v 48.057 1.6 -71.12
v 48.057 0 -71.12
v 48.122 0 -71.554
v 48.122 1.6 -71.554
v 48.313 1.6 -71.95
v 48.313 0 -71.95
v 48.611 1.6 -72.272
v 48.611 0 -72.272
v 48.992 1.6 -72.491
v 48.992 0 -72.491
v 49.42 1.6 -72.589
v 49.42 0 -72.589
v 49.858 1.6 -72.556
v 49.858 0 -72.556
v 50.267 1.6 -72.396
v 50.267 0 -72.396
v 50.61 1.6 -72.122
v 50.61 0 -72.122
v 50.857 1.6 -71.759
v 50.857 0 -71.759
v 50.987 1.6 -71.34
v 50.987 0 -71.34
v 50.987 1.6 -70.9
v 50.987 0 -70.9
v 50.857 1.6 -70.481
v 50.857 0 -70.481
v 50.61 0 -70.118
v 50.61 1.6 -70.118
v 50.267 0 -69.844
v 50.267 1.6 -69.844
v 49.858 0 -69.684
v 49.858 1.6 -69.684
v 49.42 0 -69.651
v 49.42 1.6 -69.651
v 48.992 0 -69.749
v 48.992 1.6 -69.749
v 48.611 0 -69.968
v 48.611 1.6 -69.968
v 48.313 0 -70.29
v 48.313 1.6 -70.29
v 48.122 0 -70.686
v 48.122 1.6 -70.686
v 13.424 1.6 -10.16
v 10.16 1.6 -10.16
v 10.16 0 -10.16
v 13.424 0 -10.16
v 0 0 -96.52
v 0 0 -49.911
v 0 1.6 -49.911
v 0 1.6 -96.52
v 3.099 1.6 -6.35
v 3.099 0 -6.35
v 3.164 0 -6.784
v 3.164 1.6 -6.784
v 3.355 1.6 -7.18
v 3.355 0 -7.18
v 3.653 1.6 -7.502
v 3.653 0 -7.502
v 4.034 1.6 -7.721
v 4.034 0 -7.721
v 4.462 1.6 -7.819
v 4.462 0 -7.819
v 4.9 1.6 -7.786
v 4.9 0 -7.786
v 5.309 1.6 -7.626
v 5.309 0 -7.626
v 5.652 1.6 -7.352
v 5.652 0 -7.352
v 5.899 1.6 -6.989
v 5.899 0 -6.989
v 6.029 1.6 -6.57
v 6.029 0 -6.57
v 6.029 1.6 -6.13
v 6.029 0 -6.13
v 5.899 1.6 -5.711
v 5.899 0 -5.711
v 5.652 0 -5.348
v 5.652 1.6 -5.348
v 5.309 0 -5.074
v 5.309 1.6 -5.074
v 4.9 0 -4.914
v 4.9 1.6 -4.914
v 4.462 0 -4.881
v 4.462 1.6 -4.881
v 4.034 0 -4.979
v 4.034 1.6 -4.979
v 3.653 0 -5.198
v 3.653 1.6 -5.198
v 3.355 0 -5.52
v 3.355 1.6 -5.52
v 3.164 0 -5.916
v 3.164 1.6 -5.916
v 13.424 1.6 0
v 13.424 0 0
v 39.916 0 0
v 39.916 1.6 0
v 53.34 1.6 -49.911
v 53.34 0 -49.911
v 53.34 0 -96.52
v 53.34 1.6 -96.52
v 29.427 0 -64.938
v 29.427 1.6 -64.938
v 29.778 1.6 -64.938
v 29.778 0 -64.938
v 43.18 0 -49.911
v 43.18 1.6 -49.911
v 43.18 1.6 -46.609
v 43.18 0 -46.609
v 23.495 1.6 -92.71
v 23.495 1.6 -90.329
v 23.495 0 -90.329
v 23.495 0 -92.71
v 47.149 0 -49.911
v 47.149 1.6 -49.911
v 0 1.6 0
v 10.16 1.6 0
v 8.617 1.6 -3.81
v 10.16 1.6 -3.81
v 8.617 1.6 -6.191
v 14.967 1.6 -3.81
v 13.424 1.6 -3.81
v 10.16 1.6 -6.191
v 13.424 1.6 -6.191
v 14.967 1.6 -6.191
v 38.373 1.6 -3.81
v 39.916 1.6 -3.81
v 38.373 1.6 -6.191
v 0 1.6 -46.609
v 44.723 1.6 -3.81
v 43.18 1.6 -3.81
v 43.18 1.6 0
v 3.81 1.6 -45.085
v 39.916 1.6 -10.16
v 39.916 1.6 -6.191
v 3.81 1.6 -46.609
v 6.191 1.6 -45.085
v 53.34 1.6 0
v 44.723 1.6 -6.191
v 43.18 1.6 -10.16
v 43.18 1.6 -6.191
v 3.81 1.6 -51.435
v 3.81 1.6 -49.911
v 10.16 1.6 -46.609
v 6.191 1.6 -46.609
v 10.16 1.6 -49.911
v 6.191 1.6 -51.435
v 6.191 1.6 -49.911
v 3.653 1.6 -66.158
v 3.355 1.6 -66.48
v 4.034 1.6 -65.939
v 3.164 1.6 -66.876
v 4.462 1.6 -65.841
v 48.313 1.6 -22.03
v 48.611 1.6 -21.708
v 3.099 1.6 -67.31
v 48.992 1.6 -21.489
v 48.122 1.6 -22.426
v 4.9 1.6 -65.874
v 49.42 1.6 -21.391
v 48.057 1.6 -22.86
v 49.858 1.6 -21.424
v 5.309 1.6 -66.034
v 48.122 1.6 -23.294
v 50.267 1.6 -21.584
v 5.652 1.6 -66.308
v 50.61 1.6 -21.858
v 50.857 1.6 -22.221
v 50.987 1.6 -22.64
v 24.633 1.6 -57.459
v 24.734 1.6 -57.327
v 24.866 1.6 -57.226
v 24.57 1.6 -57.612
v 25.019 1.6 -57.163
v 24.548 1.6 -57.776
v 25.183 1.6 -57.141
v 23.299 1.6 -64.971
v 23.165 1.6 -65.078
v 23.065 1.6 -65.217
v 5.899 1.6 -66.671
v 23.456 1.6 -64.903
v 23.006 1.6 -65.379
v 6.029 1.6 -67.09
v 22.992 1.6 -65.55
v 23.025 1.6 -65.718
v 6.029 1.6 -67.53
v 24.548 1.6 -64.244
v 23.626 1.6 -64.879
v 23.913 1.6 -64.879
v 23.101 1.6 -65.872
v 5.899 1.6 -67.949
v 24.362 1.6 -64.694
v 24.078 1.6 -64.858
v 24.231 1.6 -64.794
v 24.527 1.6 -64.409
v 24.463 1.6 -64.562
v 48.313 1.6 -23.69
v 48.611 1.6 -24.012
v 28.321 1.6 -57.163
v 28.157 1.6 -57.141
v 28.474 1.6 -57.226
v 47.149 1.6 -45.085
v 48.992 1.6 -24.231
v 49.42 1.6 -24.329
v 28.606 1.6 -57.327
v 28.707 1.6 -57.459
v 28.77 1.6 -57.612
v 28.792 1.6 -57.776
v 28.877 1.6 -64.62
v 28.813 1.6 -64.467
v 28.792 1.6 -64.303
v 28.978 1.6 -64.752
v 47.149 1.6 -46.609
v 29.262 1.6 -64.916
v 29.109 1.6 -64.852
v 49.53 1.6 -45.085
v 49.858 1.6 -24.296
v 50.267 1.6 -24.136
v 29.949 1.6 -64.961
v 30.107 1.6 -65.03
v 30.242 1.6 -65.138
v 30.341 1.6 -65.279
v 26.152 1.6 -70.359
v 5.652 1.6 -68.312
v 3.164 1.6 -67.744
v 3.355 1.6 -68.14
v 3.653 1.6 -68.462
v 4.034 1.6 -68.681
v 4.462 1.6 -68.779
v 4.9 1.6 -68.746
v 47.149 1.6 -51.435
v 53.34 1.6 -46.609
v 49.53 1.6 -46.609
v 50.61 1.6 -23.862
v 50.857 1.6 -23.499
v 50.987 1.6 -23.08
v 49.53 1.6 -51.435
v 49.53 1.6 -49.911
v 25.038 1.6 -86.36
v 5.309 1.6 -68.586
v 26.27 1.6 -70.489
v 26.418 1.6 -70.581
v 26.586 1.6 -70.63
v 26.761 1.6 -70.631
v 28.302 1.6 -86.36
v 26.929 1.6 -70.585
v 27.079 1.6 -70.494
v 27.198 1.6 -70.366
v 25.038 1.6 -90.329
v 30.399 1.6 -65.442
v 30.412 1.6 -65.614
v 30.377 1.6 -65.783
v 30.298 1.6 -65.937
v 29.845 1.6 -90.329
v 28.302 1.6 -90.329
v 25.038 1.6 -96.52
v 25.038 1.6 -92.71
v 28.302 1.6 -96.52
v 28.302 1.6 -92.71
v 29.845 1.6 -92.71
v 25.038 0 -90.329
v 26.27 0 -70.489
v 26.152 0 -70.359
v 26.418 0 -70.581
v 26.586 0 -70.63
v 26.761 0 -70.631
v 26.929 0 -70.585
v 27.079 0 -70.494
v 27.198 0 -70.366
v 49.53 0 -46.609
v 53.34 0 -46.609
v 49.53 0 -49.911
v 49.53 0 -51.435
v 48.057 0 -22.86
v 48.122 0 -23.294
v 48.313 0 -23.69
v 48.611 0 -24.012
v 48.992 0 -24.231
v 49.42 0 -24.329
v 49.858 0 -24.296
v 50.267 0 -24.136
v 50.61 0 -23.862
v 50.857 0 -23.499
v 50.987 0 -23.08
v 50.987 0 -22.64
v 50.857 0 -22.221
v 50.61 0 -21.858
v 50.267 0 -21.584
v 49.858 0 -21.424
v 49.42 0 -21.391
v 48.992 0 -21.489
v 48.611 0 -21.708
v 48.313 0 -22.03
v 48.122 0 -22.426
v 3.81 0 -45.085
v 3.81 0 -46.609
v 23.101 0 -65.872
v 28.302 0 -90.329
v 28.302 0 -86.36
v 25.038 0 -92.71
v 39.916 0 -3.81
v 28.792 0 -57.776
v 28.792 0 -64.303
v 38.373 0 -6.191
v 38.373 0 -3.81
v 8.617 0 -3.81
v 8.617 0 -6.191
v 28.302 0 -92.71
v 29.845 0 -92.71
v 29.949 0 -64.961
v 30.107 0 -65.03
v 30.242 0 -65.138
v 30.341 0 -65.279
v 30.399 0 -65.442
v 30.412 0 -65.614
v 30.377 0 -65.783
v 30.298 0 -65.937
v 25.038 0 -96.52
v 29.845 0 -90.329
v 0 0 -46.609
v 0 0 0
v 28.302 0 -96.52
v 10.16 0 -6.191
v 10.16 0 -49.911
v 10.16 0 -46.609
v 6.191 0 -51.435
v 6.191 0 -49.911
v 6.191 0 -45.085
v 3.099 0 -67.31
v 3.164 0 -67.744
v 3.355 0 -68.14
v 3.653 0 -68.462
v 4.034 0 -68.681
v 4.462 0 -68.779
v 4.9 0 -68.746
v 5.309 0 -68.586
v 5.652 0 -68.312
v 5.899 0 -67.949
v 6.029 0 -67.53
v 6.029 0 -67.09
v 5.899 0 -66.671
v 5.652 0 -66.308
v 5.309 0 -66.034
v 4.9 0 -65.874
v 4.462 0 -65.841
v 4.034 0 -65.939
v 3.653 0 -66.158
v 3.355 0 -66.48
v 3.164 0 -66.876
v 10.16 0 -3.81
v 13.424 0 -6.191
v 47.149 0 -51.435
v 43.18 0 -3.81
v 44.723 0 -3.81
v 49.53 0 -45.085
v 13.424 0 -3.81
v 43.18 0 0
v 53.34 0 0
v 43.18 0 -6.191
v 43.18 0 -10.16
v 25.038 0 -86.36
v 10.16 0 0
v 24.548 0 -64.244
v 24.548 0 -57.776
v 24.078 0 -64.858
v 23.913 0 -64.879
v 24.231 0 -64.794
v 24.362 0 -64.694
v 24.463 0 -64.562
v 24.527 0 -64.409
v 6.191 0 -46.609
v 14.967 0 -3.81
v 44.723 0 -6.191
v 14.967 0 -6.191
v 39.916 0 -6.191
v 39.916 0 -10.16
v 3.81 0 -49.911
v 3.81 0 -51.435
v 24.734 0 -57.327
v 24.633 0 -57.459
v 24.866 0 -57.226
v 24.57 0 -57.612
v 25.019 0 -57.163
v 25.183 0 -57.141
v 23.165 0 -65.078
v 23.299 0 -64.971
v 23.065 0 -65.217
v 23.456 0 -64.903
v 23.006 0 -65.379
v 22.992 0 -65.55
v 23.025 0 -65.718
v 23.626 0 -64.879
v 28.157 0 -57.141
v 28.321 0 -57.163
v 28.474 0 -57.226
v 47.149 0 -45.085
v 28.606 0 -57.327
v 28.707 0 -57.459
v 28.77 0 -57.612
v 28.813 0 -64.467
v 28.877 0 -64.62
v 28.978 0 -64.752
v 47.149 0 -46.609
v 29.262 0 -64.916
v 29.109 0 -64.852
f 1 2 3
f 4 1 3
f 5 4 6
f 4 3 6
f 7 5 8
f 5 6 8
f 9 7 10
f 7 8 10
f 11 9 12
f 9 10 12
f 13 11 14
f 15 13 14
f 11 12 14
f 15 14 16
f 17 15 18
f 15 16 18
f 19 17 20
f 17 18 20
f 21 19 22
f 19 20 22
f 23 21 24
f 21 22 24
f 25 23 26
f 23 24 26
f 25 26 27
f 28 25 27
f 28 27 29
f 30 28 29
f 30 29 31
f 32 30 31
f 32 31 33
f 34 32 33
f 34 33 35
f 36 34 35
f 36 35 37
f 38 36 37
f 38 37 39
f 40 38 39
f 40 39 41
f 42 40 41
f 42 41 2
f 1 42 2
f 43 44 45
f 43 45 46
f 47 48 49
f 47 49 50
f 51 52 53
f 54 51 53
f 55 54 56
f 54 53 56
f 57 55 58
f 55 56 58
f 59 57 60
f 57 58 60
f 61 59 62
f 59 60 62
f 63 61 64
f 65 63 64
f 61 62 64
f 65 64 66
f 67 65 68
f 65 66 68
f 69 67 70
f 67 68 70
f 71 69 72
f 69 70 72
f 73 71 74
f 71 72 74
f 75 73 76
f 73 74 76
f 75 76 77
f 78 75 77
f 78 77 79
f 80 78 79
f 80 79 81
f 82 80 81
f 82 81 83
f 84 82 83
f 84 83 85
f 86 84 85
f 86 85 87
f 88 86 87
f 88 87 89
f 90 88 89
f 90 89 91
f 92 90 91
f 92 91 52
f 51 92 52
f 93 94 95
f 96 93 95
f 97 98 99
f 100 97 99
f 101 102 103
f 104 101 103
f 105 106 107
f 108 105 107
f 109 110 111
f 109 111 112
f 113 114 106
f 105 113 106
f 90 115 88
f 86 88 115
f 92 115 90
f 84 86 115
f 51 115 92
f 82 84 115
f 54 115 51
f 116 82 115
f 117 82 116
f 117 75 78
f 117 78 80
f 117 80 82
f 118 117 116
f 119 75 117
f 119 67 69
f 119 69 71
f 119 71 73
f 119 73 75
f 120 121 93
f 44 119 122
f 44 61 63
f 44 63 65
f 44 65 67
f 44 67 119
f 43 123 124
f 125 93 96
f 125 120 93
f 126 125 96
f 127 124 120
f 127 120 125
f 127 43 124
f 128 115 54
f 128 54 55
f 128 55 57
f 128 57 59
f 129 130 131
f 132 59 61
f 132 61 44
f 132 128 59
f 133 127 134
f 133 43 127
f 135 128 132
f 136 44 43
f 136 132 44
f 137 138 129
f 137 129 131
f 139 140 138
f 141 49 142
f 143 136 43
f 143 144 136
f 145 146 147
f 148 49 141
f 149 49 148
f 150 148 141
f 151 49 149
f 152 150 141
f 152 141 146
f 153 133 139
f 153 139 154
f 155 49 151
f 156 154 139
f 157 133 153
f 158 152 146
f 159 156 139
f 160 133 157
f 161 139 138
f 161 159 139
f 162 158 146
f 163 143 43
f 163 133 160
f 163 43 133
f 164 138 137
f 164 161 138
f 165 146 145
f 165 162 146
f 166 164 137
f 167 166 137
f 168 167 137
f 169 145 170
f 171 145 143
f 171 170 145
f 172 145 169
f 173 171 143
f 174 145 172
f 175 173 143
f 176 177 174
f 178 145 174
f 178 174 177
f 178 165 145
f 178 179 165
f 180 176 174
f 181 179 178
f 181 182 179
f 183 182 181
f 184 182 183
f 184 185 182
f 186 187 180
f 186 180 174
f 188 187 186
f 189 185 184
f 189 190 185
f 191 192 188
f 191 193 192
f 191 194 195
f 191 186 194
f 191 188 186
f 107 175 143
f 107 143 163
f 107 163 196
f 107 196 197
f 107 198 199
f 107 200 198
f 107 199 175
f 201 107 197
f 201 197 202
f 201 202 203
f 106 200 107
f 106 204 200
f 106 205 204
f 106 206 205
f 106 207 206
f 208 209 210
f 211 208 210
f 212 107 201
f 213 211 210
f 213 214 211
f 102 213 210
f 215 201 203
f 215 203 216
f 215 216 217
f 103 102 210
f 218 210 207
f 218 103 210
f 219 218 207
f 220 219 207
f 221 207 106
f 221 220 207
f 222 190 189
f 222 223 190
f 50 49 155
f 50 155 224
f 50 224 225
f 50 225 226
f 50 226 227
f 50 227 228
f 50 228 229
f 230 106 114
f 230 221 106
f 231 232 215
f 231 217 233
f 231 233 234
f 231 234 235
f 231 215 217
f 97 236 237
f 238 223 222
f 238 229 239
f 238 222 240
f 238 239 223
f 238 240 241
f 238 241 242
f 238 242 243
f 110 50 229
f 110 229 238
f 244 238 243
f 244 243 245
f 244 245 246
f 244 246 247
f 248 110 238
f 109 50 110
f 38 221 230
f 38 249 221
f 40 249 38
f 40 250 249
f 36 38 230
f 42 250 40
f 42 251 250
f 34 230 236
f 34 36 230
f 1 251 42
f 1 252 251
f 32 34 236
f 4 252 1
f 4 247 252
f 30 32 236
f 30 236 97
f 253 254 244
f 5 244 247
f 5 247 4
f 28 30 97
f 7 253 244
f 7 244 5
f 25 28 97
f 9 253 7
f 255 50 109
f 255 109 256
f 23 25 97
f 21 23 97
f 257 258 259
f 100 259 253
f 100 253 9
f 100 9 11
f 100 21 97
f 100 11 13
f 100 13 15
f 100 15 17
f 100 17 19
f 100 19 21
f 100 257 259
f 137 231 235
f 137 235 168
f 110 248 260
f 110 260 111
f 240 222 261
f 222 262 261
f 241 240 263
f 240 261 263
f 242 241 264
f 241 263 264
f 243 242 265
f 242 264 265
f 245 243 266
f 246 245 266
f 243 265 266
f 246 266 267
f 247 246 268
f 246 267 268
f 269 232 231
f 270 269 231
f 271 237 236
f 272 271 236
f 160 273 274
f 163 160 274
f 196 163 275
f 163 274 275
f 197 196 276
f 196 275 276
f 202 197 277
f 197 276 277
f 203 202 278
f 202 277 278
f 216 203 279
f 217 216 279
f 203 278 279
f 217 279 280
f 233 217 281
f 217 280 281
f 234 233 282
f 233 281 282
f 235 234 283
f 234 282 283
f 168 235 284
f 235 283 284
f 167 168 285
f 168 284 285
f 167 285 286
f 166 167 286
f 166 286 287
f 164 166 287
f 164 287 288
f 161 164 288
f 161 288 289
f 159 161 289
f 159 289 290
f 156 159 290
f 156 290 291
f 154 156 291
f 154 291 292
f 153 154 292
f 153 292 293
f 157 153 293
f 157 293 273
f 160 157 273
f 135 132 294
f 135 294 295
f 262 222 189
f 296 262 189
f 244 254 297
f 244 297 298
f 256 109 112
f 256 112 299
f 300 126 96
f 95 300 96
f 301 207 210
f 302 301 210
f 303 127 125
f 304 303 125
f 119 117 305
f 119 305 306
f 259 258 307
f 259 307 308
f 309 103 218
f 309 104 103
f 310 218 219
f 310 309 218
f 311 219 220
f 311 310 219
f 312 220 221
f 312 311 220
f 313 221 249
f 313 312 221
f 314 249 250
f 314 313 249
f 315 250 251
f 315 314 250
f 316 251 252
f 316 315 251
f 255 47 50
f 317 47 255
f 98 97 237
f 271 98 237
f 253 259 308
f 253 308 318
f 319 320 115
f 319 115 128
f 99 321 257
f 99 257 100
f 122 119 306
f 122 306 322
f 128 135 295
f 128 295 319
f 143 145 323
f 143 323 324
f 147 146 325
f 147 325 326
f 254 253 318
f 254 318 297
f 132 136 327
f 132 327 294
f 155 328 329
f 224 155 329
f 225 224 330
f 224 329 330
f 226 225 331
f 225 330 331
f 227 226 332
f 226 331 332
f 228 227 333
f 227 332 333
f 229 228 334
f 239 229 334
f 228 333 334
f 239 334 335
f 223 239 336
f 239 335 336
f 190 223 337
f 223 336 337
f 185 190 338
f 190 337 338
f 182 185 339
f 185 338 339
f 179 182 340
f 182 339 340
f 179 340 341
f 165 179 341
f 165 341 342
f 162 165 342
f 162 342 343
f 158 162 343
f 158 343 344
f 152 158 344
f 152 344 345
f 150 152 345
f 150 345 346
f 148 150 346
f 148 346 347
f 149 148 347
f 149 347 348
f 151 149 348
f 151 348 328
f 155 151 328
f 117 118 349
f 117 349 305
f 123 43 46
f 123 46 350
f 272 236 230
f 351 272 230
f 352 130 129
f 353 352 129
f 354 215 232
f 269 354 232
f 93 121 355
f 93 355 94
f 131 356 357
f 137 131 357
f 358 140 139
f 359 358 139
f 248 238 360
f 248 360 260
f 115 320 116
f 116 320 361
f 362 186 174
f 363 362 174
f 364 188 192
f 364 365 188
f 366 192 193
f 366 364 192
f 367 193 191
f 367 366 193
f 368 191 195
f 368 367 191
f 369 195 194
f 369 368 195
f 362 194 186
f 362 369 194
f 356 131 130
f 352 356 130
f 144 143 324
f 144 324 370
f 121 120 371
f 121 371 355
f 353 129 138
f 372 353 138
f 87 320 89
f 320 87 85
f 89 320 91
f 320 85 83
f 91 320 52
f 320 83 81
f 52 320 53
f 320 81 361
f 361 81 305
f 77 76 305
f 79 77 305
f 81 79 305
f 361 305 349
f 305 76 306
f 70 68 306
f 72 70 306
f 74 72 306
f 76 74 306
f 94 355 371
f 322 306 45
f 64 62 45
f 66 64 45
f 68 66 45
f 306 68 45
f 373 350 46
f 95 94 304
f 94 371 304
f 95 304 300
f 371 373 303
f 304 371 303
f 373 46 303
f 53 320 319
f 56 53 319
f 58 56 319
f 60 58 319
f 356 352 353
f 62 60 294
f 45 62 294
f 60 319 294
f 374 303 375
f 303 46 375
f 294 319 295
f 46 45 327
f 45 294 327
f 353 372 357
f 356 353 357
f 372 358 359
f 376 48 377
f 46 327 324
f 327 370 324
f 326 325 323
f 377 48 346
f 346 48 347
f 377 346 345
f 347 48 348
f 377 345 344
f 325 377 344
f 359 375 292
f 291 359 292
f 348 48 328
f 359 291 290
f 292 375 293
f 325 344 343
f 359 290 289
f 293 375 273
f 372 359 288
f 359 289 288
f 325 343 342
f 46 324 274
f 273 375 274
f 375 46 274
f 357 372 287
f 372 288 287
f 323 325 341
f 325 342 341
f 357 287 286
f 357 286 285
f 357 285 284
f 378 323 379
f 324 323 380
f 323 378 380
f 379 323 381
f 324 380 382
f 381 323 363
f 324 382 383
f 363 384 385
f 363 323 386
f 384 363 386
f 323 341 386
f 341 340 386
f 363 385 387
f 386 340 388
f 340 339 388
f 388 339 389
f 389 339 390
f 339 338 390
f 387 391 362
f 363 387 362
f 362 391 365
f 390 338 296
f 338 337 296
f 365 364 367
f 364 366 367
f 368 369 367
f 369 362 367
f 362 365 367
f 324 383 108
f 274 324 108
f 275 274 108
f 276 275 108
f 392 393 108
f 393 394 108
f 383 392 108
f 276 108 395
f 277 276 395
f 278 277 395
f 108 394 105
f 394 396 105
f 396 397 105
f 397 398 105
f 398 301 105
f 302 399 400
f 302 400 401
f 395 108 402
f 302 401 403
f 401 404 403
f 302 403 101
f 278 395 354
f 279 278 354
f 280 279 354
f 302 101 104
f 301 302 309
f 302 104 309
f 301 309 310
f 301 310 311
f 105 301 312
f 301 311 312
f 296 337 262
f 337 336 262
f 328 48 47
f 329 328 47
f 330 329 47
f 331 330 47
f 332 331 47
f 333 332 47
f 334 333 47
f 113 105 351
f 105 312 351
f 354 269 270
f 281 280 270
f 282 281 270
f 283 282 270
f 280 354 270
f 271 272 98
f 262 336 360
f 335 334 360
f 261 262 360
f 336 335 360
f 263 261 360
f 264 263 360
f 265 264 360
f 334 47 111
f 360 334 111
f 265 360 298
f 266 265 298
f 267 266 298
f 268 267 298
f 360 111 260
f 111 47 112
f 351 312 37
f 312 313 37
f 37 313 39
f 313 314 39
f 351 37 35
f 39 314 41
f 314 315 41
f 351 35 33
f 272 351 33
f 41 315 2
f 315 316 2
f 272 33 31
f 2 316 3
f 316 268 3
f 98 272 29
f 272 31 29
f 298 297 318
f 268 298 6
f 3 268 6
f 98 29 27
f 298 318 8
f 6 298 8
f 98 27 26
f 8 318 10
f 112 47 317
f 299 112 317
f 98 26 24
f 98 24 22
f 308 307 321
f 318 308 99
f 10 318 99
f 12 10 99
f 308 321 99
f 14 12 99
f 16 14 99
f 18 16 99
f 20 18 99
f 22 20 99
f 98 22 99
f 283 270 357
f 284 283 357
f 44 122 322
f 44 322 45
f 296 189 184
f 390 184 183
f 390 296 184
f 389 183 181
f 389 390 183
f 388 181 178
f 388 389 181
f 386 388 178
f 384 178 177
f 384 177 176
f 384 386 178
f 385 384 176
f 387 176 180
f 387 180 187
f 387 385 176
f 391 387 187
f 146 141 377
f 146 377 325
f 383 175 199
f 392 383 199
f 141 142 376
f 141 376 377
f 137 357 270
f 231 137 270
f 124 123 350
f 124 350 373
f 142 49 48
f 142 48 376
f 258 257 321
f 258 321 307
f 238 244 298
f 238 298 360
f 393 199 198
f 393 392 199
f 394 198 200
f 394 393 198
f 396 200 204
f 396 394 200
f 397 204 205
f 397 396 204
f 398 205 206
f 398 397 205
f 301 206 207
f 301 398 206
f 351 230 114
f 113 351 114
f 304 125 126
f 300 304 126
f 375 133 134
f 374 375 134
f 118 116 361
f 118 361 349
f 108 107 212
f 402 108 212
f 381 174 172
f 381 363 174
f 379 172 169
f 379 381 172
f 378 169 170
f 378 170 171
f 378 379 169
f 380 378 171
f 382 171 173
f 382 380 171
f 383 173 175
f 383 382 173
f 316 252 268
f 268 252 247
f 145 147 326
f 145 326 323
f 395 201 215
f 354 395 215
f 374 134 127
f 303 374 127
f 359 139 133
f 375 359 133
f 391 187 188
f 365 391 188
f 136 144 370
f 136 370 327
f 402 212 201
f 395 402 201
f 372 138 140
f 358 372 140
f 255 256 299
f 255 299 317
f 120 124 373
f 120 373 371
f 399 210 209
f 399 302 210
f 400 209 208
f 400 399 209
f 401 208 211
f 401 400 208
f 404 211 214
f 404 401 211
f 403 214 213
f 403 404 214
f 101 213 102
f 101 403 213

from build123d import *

# Parameters (mm, degrees)
SKETCH1_W                       = 53.34
SKETCH1_H                       = 96.52
BOSS_EXTRUDE1_DEPTH             = 1.6002
CUT_EXTRUDE1_DEPTH              = 1.6002
F_32_0_116_DIAMETER_HOLE1_D     = 2.9464
F_32_0_116_DIAMETER_HOLE1_DEPTH = 25.4
F_32_0_116_DIAMETER_HOLE1_TIP   = 0.885187864
CUT_EXTRUDE2_DEPTH              = 2.54
FILLET1_R                       = 0.635


with BuildPart() as part:
    # Sketch1 → Boss-Extrude1 (new body)
    with BuildSketch(Plane(origin=(0, 0, 0), x_dir=(1, 0, 0), z_dir=(0, 1, 0))):
        with Locations((26.67, 48.26)):
            Rectangle(SKETCH1_W, SKETCH1_H)
    extrude(amount=BOSS_EXTRUDE1_DEPTH)

    # Sketch2 → Cut-Extrude1 (cut)
    with BuildSketch(Plane(origin=(0, 1.6002, 0), x_dir=(1, 0, 0), z_dir=(0, 1, 0))):
        Polygon((10.16, 0), (10.16, 3.81), (8.61695, 3.81), (8.61695, 6.19125), (10.16, 6.19125), (10.16, 10.16), (13.4239, 10.16), (13.4239, 6.19125), (14.96695, 6.19125), (14.96695, 3.81), (13.4239, 3.81), (13.4239, 0), align=None)
        Polygon((28.30195, 96.52), (28.30195, 92.71), (29.845, 92.71), (29.845, 90.32875), (28.30195, 90.32875), (28.30195, 86.36), (25.03805, 86.36), (25.03805, 90.32875), (23.495, 90.32875), (23.495, 92.71), (25.03805, 92.71), (25.03805, 96.52), align=None)
        Polygon((39.9161, 0), (43.18, 0), (43.18, 3.81), (44.72305, 3.81), (44.72305, 6.19125), (43.18, 6.19125), (43.18, 10.16), (39.9161, 10.16), (39.9161, 6.19125), (38.37305, 6.19125), (38.37305, 3.81), (39.9161, 3.81), align=None)
        Polygon((0, 49.911), (3.81, 49.911), (3.81, 51.435), (6.19125, 51.435), (6.19125, 49.911), (10.16, 49.911), (10.16, 46.609), (6.19125, 46.609), (6.19125, 45.085), (3.81, 45.085), (3.81, 46.609), (0, 46.609), align=None)
        Polygon((53.34, 46.609), (53.34, 49.911), (49.53, 49.911), (49.53, 51.435), (47.14875, 51.435), (47.14875, 49.911), (43.18, 49.911), (43.18, 46.609), (47.14875, 46.609), (47.14875, 45.085), (49.53, 45.085), (49.53, 46.609), align=None)
    extrude(amount=-CUT_EXTRUDE1_DEPTH, mode=Mode.SUBTRACT)

    # #32 (0.116) Diameter Hole1
    with Locations(Plane(origin=(0, 1.6002, 0), x_dir=(1, 0, 0), z_dir=(0, 1, 0))):
        with Locations((4.572, 6.35), (49.53, 22.86), (49.53, 71.12), (4.572, 67.31)):
            Hole(F_32_0_116_DIAMETER_HOLE1_D / 2, depth=F_32_0_116_DIAMETER_HOLE1_DEPTH)
            with Locations((0, 0, -(F_32_0_116_DIAMETER_HOLE1_DEPTH + F_32_0_116_DIAMETER_HOLE1_TIP / 2))):  # 118° drill point
                Cone(0, F_32_0_116_DIAMETER_HOLE1_D / 2, F_32_0_116_DIAMETER_HOLE1_TIP, mode=Mode.SUBTRACT)

    # Sketch7 → Cut-Extrude2 (cut)
    with BuildSketch(Plane(origin=(0, 1.6002, 0), x_dir=(1, 0, 0), z_dir=(0, 1, 0))):
        Polygon((26.67, 71.12), (22.426456564, 64.879494947), (24.548228282, 64.879494947), (24.548228282, 57.141268682), (26.67, 57.141268682), (28.791771718, 57.141268682), (28.791771718, 64.937563076), (30.997705847, 64.937563076), align=None)
    extrude(amount=-CUT_EXTRUDE2_DEPTH, mode=Mode.SUBTRACT)

    # Fillet1
    fillet1_edges = [part.edges().sort_by_distance(p)[0] for p in [
        (26.67, 0.8001, -71.12),
        (30.997705847, 0.8001, -64.937563076),
        (28.791771718, 0.8001, -64.937563076),
        (28.791771718, 0.8001, -57.141268682),
        (24.548228282, 0.8001, -57.141268682),
        (24.548228282, 0.8001, -64.879494947),
        (22.426456564, 0.8001, -64.879494947),
    ]]
    fillet(fillet1_edges, radius=FILLET1_R)


solid = part.part
